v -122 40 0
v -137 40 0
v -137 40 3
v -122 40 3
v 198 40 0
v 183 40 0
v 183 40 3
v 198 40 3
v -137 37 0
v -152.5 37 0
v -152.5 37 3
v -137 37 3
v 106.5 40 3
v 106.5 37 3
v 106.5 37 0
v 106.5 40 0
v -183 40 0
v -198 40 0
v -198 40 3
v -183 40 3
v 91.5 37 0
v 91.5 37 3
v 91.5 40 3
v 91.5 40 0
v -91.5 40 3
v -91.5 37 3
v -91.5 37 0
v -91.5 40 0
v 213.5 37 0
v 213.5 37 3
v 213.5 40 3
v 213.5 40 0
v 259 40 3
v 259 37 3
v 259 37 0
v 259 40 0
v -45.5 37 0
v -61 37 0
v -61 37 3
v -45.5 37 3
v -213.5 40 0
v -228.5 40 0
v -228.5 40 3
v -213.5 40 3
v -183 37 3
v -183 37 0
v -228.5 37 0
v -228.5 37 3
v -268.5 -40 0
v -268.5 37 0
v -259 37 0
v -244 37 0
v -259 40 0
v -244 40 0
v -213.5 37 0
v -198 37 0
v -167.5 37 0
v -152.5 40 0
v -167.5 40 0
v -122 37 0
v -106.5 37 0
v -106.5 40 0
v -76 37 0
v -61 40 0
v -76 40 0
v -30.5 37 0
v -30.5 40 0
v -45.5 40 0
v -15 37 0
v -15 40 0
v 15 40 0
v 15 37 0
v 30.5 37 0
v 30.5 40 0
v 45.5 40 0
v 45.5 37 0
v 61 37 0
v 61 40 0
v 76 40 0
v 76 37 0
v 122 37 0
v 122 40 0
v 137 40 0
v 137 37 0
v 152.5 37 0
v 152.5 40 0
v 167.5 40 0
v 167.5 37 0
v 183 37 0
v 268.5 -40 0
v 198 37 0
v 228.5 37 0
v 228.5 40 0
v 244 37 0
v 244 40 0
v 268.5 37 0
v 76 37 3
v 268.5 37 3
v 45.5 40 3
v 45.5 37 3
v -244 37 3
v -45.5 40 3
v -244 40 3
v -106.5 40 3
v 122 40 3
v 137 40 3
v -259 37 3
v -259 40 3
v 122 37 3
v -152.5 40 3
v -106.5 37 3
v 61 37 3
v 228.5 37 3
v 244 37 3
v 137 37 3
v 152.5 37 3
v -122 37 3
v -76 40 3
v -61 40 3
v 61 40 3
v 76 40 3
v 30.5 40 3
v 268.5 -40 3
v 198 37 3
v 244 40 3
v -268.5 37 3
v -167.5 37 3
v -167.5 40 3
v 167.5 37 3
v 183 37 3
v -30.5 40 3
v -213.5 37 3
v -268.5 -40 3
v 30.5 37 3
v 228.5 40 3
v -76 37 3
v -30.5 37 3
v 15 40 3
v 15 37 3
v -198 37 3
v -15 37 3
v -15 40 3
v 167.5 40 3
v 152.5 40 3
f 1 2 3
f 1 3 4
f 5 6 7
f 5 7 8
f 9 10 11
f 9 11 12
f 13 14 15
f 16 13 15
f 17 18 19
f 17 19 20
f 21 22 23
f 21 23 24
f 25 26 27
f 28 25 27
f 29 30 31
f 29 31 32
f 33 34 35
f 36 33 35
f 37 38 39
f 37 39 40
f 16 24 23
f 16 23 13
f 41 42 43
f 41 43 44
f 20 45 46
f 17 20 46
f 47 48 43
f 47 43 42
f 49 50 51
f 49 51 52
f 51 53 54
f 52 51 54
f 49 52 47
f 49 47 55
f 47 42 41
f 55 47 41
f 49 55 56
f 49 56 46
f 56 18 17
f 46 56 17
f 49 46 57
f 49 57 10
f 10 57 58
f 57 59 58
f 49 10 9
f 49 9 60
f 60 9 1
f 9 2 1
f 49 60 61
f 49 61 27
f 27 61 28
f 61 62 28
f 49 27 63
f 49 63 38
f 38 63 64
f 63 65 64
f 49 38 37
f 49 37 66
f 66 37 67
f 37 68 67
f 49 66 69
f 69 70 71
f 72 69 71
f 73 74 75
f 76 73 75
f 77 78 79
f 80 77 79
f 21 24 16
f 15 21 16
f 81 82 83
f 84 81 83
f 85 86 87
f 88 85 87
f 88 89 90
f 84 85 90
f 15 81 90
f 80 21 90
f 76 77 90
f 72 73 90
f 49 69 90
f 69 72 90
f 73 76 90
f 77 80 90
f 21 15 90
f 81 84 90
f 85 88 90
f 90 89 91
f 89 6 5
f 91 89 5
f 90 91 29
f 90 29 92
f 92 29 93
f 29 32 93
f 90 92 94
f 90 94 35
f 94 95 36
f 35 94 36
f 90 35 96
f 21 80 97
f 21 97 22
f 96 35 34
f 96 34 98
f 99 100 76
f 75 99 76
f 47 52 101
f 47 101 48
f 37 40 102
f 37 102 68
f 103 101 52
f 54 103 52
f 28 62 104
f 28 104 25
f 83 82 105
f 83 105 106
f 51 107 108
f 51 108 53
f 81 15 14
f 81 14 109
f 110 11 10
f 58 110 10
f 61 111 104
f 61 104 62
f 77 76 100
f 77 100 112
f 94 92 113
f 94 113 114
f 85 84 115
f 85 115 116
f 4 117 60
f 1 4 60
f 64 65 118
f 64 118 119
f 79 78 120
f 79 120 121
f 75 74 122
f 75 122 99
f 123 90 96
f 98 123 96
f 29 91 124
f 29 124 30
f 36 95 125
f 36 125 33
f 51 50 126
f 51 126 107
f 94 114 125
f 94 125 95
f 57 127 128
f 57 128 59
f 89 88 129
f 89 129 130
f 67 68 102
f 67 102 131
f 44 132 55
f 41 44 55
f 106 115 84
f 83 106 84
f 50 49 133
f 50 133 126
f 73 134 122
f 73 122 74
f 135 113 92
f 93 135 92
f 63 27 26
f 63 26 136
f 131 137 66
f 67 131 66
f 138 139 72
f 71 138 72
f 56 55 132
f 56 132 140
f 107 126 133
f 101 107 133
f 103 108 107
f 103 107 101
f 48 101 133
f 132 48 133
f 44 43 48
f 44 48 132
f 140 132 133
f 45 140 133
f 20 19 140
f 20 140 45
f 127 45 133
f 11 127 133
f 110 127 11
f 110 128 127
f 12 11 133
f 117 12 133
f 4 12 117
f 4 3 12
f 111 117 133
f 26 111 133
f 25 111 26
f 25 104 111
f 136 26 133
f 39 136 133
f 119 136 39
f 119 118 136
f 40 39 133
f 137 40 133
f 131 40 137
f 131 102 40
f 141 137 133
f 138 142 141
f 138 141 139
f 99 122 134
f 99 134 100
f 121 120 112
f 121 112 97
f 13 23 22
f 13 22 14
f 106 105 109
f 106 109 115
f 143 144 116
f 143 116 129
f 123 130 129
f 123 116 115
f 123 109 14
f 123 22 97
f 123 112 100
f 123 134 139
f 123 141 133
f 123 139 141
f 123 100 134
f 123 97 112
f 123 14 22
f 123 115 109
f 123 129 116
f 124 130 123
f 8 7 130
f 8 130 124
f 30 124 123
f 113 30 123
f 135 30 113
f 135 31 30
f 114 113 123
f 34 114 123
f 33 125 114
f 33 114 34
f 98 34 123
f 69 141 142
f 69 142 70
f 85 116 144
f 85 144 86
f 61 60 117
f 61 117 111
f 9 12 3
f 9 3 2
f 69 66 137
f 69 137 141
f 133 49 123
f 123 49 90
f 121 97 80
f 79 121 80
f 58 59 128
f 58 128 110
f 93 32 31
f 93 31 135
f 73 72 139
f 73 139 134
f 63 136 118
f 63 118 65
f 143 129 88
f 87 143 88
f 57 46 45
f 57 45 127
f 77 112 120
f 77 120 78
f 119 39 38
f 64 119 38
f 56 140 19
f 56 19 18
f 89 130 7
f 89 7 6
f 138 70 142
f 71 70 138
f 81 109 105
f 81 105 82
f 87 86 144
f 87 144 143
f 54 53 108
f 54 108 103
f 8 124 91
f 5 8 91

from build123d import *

# Parameters (mm, degrees)
SKETCH1_W           = 537
SKETCH1_H           = 80
BOSS_EXTRUDE1_DEPTH = 3
CAVITY1_START       = 37
CAVITY1_OUTLINE_W   = 15.5
CAVITY1_OUTLINE_H   = 3
CAVITY1_OUTLINE_W_2 = 9.5
CAVITY1_DEPTH       = 3


# Read off the part's stored shape, not the designer's step: Cavity1
with BuildPart() as part:
    # Sketch1 → Boss-Extrude1 (new body)
    with BuildSketch(Plane.XY):
        Rectangle(SKETCH1_W, SKETCH1_H)
    extrude(amount=BOSS_EXTRUDE1_DEPTH)

    # Cavity1 outline → Cavity1 (cut)
    with BuildSketch(Plane(origin=(0, 0, 0), x_dir=(1, 0, 0), z_dir=(0, 1, 0)).offset(CAVITY1_START)):
        with Locations((-236.25, -1.5)):
            Rectangle(CAVITY1_OUTLINE_W, CAVITY1_OUTLINE_H)
        with Locations((-263.75, -1.5)):
            Rectangle(CAVITY1_OUTLINE_W_2, CAVITY1_OUTLINE_H)
        with Locations((-205.75, -1.5)):
            Rectangle(CAVITY1_OUTLINE_W, CAVITY1_OUTLINE_H)
        with Locations((-175.25, -1.5)):
            Rectangle(CAVITY1_OUTLINE_W, CAVITY1_OUTLINE_H)
        with Locations((-144.75, -1.5)):
            Rectangle(CAVITY1_OUTLINE_W, CAVITY1_OUTLINE_H)
        with Locations((-114.25, -1.5)):
            Rectangle(CAVITY1_OUTLINE_W, CAVITY1_OUTLINE_H)
        with Locations((-83.75, -1.5)):
            Rectangle(CAVITY1_OUTLINE_W, CAVITY1_OUTLINE_H)
        with Locations((-53.25, -1.5)):
            Rectangle(CAVITY1_OUTLINE_W, CAVITY1_OUTLINE_H)
        with Locations((-22.75, -1.5)):
            Rectangle(CAVITY1_OUTLINE_W, CAVITY1_OUTLINE_H)
        with Locations((22.75, -1.5)):
            Rectangle(CAVITY1_OUTLINE_W, CAVITY1_OUTLINE_H)
        with Locations((53.25, -1.5)):
            Rectangle(CAVITY1_OUTLINE_W, CAVITY1_OUTLINE_H)
        with Locations((83.75, -1.5)):
            Rectangle(CAVITY1_OUTLINE_W, CAVITY1_OUTLINE_H)
        with Locations((114.25, -1.5)):
            Rectangle(CAVITY1_OUTLINE_W, CAVITY1_OUTLINE_H)
        with Locations((144.75, -1.5)):
            Rectangle(CAVITY1_OUTLINE_W, CAVITY1_OUTLINE_H)
        with Locations((175.25, -1.5)):
            Rectangle(CAVITY1_OUTLINE_W, CAVITY1_OUTLINE_H)
        with Locations((205.75, -1.5)):
            Rectangle(CAVITY1_OUTLINE_W, CAVITY1_OUTLINE_H)
        with Locations((236.25, -1.5)):
            Rectangle(CAVITY1_OUTLINE_W, CAVITY1_OUTLINE_H)
        with Locations((263.75, -1.5)):
            Rectangle(CAVITY1_OUTLINE_W_2, CAVITY1_OUTLINE_H)
    extrude(amount=CAVITY1_DEPTH, mode=Mode.SUBTRACT)


solid = part.part
